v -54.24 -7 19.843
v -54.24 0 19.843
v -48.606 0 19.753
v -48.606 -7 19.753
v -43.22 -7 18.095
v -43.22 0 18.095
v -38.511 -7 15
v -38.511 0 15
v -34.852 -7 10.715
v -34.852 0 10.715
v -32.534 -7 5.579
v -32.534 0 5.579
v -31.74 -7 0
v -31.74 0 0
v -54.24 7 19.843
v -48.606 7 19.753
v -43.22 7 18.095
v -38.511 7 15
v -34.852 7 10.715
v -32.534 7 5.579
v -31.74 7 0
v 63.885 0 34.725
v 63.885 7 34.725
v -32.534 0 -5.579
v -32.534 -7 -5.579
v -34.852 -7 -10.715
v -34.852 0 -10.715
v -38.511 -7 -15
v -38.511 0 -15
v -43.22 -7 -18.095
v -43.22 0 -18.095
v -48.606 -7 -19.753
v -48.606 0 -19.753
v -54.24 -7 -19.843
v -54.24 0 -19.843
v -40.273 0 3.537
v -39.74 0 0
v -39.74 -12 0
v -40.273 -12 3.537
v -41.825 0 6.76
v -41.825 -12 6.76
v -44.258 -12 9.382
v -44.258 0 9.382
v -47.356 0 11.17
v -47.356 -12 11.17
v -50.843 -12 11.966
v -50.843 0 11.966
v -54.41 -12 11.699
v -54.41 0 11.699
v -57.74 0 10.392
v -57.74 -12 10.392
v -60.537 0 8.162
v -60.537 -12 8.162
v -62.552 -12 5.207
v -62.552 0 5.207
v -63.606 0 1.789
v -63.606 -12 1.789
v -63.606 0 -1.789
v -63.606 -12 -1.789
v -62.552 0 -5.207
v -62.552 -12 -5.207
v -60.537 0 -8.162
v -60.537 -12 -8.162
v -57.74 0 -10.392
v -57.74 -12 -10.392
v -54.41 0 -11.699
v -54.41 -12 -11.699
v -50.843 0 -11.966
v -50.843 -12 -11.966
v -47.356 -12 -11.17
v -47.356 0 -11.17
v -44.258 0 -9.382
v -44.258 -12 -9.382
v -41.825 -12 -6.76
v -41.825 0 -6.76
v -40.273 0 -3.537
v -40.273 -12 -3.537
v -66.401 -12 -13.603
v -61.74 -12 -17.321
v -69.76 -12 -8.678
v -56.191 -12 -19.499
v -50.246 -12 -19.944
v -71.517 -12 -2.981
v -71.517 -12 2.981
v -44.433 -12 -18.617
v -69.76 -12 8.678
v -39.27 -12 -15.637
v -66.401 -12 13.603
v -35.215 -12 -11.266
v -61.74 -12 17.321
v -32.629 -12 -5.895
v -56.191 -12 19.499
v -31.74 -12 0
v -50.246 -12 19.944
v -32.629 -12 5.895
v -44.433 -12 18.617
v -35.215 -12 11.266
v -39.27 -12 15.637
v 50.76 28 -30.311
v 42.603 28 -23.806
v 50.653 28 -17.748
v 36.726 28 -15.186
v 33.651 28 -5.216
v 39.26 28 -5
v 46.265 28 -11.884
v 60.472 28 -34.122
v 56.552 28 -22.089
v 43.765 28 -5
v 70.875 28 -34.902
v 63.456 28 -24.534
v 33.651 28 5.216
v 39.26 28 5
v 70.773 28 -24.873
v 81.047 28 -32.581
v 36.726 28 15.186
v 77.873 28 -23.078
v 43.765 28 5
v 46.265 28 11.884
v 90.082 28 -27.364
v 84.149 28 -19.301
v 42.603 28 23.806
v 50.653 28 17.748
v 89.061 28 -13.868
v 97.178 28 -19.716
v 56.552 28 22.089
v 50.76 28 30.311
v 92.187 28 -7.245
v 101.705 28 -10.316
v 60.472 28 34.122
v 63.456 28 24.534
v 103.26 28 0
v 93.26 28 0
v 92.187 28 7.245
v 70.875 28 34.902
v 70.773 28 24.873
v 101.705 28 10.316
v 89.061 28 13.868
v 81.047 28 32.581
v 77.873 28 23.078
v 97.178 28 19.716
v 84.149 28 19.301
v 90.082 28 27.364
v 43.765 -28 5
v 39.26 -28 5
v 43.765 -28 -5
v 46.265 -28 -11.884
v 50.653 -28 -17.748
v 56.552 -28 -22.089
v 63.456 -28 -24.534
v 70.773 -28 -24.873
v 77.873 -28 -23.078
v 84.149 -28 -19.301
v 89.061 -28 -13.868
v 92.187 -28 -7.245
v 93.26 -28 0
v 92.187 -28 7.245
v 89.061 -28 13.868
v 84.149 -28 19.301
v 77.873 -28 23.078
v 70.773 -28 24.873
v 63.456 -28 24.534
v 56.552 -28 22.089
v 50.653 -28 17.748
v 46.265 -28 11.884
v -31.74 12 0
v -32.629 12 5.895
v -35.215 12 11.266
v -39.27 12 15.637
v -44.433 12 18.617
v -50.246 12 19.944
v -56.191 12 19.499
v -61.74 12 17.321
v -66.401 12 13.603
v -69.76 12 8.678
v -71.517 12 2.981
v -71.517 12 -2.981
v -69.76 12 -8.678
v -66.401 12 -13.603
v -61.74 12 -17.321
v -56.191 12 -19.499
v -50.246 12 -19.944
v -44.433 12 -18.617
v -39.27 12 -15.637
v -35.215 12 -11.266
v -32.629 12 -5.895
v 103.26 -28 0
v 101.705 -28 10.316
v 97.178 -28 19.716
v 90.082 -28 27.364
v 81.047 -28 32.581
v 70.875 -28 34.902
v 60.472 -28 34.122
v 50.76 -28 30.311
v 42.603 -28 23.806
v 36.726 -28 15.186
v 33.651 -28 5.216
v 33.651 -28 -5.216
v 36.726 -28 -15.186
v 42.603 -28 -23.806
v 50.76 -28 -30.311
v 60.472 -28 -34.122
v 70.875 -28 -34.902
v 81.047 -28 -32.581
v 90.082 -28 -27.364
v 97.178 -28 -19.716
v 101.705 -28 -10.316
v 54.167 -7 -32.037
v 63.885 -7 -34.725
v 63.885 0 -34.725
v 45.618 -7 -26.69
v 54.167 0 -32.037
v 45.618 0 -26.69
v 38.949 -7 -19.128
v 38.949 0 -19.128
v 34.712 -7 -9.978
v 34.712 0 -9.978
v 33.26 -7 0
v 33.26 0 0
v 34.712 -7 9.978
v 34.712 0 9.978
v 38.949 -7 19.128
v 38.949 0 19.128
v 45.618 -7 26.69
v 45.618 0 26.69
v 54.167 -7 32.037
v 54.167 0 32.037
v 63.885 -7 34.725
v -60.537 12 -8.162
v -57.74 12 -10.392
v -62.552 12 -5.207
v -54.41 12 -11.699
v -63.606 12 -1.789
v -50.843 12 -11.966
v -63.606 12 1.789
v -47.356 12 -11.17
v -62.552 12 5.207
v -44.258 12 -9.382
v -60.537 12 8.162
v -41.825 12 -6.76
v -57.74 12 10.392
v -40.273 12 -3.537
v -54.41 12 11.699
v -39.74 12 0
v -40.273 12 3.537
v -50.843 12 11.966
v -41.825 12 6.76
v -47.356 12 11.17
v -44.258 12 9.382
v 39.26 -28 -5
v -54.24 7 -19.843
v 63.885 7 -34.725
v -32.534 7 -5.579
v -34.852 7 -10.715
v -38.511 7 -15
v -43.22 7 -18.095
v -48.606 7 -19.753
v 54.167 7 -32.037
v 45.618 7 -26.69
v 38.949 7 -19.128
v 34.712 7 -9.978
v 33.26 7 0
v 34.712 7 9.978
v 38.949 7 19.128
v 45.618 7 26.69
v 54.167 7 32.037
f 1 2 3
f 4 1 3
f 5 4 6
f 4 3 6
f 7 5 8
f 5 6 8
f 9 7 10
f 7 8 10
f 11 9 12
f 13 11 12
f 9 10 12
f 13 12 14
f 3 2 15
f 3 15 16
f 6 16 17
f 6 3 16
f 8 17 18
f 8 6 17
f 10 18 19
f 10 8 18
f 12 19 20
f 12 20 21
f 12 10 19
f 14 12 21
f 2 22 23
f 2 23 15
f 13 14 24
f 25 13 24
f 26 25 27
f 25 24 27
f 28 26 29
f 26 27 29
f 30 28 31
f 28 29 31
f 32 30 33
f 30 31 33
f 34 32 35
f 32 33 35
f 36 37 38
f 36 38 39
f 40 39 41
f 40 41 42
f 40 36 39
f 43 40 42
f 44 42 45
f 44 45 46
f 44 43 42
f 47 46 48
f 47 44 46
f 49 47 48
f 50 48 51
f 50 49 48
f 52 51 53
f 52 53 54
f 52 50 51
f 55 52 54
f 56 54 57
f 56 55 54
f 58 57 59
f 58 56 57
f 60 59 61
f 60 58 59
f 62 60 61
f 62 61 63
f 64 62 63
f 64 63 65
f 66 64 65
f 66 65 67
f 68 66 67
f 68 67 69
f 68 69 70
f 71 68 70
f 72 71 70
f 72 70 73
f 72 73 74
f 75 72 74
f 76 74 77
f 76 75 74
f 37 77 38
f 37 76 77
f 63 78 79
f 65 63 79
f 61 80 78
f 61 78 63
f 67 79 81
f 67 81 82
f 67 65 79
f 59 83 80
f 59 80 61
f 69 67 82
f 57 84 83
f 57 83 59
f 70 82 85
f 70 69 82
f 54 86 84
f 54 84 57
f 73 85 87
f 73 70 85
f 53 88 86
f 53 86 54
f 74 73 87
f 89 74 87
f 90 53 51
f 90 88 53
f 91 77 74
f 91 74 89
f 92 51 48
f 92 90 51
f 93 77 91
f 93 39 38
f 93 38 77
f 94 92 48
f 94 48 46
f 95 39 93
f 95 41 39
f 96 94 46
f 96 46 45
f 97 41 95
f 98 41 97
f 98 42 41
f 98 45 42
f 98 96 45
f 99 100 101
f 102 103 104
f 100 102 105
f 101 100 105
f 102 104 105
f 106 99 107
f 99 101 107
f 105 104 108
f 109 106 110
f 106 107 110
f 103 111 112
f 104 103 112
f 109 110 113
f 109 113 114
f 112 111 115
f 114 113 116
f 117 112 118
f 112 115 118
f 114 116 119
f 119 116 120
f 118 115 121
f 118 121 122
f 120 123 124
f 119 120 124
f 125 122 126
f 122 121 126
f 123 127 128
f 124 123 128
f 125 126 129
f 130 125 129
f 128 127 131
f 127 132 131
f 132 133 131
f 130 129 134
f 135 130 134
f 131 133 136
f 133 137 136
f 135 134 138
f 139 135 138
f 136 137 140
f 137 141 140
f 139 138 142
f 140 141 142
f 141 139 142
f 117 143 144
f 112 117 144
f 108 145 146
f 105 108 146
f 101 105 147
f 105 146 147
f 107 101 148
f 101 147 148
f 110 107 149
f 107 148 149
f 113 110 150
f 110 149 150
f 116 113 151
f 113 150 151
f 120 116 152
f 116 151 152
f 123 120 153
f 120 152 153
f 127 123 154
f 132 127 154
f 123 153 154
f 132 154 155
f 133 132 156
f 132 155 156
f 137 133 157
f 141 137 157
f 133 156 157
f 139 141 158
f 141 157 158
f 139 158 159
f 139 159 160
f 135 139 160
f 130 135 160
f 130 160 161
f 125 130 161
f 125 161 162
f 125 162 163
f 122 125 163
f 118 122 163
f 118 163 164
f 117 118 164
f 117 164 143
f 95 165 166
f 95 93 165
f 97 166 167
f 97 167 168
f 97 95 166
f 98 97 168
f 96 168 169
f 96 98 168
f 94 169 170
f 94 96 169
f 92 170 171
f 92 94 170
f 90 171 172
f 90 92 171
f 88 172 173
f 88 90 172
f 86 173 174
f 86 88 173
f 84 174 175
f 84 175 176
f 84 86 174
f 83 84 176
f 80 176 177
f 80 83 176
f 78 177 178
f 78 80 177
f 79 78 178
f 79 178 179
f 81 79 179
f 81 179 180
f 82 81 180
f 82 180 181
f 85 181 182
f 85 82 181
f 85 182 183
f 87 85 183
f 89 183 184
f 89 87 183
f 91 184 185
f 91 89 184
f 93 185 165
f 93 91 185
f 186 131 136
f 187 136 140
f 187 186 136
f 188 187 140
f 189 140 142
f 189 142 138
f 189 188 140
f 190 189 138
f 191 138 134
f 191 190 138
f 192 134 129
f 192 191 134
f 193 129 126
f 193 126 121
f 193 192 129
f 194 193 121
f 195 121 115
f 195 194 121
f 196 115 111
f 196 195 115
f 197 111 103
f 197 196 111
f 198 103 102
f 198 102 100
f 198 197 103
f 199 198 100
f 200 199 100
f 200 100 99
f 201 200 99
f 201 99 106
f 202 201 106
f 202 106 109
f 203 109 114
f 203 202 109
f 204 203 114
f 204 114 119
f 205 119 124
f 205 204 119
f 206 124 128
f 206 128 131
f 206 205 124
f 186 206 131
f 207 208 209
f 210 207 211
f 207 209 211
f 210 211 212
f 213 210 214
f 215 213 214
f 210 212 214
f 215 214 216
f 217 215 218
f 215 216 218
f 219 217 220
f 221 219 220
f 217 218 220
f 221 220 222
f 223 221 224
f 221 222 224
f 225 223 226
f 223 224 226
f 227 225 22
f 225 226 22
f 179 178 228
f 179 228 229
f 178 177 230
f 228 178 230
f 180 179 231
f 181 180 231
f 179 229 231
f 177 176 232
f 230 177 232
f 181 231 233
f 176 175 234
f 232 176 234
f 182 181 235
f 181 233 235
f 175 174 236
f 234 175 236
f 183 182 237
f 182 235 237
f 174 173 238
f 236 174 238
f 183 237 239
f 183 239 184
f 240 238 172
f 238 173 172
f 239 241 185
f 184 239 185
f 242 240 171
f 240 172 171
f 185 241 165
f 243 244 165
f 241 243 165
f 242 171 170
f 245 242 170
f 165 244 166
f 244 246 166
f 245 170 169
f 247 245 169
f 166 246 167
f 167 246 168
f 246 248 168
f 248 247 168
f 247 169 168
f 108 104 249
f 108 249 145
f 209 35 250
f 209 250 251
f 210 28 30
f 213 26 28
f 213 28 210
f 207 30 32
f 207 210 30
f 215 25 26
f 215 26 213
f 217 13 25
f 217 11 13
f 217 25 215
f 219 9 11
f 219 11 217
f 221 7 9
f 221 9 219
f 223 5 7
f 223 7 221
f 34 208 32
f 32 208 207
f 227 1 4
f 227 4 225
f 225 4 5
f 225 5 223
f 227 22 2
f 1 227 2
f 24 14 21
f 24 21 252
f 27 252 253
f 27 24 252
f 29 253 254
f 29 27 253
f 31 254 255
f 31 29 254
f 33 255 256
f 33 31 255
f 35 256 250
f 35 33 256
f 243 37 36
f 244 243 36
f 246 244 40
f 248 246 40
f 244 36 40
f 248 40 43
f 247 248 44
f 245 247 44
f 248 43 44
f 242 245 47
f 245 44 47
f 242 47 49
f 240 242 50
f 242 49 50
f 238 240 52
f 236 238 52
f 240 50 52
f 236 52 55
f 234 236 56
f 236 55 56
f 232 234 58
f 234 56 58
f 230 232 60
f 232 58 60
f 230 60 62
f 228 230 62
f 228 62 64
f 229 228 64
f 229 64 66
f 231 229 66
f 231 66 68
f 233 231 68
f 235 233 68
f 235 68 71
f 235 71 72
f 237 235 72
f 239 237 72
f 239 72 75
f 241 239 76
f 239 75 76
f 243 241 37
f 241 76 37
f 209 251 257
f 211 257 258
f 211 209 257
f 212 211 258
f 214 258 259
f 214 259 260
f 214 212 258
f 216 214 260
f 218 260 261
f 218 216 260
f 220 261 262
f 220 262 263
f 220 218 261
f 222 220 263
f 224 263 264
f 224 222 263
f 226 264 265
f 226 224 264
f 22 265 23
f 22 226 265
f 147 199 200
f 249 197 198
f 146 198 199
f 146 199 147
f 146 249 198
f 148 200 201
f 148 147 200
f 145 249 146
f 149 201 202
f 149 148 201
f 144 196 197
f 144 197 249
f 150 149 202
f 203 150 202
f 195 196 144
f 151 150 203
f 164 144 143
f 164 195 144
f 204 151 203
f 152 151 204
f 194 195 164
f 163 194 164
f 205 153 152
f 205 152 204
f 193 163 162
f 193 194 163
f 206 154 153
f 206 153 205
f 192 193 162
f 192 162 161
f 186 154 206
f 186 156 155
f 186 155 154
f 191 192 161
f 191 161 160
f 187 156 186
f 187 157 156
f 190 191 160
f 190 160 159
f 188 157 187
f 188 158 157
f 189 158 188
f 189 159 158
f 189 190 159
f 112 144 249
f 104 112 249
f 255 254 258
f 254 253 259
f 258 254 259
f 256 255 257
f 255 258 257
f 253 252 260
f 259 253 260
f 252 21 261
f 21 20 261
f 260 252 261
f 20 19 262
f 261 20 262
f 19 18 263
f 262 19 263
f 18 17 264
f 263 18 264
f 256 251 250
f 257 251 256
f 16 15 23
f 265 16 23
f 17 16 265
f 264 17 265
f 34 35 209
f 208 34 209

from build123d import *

# Parameters (mm, degrees)
F0_R          = 20
F0_R_2        = 12
F1_DEPTH      = 12
F1_DEPTH_BACK = 12
F0_R_3        = 35
F0_R_4        = 25
F2_DEPTH      = 28
F2_DEPTH_BACK = 28
F4_DEPTH      = 69.4
F6_DEPTH      = 7
F6_DEPTH_BACK = 7


with BuildPart() as f1:
    # F0 (on Front) → F1 (new body, two sides)
    with BuildSketch(Plane.XZ) as f1_sk:
        with Locations((-51.740128547, 0)):
            Circle(F0_R)
        with Locations((-51.740128547, 0)):
            Circle(F0_R_2, mode=Mode.SUBTRACT)
    extrude(amount=F1_DEPTH)
    extrude(f1_sk.sketch, amount=-F1_DEPTH_BACK)


with BuildPart() as f2:
    # F0 (on Front) → F2 (new body, two sides)
    with BuildSketch(Plane.XZ) as f2_sk:
        with Locations((68.259871453, 0)):
            Circle(F0_R_3)
        with Locations((68.259871453, 0)):
            Circle(F0_R_4, mode=Mode.SUBTRACT)
    extrude(amount=F2_DEPTH)
    extrude(f2_sk.sketch, amount=-F2_DEPTH_BACK)

    # F3 (on face) → F4 (cut)
    with BuildSketch(Plane.XZ.offset(28)):
        with BuildLine():
            Line((39.259871453, 0), (43.259871453, 0))
            ThreePointArc((43.259871453, 0), (43.3864676279, 2.5127240501), (43.7649740252, 5))
            Line((43.7649740252, 5), (39.259871453, 5))
            Line((39.259871453, 5), (39.259871453, 0))
        make_face()
        with BuildLine():
            ThreePointArc((43.7649740252, -5), (43.3864676279, -2.5127240501), (43.259871453, 0))
            Line((43.259871453, 0), (39.259871453, 0))
            Line((39.259871453, 0), (39.259871453, -5))
            Line((39.259871453, -5), (43.7649740252, -5))
        make_face()
    extrude(amount=-F4_DEPTH, mode=Mode.SUBTRACT)


with BuildPart() as f6:
    # F5 (on Front) → F6 (new body, two sides)
    with BuildSketch(Plane.XZ) as f6_sk:
        with BuildLine():
            ThreePointArc((-31.740128547, 0), (-38.5113720324, -15.000000036), (-54.240128655, -19.8431348194))
            Line((-54.240128655, -19.8431348194), (63.8848715238, -34.7254859666))
            ThreePointArc((63.8848715238, -34.7254859666), (33.259871453, 1.118e-07), (63.8848717456, 34.7254859946))
            Line((63.8848717456, 34.7254859946), (-54.2401285338, 19.8431348346))
            ThreePointArc((-54.2401285338, 19.8431348346), (-38.5113719867, 14.9999999956), (-31.740128547, 0))
        make_face()
    extrude(amount=F6_DEPTH)
    extrude(f6_sk.sketch, amount=-F6_DEPTH_BACK)


solid = Compound([f1.part, f2.part, f6.part])
